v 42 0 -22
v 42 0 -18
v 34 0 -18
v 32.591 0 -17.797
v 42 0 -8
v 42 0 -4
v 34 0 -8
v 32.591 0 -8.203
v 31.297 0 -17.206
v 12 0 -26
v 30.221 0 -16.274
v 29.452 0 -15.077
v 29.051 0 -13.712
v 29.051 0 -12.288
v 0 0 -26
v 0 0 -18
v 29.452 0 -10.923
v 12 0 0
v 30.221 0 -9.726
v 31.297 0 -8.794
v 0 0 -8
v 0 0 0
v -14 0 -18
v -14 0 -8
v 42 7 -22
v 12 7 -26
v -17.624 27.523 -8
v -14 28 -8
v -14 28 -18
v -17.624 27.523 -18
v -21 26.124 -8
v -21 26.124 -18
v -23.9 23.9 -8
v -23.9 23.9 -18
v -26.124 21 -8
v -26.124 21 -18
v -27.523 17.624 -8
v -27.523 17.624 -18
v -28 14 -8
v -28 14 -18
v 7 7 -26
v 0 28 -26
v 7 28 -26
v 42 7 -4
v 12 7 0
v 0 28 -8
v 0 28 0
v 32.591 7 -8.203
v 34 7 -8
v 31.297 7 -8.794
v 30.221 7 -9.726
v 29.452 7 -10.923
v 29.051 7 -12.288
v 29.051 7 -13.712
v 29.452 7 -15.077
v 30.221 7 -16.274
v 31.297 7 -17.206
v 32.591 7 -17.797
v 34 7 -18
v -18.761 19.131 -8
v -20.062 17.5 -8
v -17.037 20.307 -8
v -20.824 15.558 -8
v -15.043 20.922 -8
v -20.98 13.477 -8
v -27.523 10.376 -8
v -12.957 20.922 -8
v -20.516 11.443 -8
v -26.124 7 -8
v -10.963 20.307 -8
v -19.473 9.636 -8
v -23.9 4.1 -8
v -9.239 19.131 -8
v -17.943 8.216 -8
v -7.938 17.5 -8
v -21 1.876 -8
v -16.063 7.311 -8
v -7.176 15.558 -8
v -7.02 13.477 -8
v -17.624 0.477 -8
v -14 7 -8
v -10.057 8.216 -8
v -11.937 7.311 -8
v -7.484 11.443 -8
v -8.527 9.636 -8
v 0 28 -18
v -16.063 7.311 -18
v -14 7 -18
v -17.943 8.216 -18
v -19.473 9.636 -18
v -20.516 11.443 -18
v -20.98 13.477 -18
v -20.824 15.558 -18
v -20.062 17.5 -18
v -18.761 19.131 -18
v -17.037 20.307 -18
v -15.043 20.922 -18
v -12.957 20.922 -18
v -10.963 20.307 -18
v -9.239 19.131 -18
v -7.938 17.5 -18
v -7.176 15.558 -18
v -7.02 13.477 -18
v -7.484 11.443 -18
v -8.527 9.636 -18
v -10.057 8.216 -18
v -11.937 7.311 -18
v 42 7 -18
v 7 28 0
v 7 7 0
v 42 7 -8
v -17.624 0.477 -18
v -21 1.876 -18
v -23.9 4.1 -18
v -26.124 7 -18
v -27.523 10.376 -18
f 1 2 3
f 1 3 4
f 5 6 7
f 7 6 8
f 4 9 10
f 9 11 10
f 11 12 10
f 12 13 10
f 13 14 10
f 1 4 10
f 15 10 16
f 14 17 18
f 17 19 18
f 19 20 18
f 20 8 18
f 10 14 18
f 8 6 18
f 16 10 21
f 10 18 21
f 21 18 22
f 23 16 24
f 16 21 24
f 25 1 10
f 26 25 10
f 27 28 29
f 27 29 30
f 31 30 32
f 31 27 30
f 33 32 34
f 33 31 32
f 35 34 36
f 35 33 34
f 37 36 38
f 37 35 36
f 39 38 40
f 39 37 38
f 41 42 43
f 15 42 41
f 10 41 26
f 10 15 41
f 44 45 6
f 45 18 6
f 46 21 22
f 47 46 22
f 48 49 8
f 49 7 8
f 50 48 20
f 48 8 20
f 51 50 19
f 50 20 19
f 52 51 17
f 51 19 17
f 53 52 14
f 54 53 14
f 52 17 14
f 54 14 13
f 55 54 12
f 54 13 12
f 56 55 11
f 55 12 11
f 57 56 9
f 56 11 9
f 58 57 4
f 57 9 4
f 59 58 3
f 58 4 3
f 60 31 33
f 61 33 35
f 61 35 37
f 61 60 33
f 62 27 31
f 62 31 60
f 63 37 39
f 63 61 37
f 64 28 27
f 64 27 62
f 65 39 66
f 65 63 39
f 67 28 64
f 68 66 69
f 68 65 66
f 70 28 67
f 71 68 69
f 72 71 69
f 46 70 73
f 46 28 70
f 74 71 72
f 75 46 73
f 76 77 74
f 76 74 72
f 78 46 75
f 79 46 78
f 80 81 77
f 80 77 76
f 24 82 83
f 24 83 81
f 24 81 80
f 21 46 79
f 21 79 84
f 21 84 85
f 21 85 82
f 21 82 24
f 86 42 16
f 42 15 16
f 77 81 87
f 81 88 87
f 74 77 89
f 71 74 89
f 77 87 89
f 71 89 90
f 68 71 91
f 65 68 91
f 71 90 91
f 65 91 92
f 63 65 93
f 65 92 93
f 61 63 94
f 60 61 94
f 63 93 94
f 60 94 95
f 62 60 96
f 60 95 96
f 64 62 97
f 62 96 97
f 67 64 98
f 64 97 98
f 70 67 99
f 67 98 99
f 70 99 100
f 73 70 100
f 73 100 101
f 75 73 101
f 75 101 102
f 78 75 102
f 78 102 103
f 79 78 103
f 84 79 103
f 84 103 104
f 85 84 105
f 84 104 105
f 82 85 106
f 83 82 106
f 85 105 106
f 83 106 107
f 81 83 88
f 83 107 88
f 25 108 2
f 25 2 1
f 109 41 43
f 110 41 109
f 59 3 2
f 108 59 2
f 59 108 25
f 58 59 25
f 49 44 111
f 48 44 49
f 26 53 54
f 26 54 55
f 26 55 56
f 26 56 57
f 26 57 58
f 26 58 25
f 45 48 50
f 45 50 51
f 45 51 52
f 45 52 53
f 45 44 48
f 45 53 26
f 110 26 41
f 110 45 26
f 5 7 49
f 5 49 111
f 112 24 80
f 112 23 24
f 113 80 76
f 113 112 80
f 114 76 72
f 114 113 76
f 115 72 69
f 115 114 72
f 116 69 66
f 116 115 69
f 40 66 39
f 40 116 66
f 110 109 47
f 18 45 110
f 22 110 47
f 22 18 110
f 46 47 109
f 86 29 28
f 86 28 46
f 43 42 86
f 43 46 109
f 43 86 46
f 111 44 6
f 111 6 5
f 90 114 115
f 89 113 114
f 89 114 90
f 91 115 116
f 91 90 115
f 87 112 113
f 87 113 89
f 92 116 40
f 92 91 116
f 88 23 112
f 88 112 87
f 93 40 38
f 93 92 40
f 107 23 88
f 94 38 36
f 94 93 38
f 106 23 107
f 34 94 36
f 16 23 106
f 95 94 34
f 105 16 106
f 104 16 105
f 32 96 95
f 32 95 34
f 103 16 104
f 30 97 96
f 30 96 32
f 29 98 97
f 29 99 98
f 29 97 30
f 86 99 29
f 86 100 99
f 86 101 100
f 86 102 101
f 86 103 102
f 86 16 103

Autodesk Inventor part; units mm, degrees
ref_plane "YZ Plane" through (0, 0, 0) normal (1, 0, 0) x (0, 1, 0)
ref_plane "XZ Plane" through (0, 0, 0) normal (0, 1, 0) x (-1, 0, 0)
ref_plane "XY Plane" through (0, 0, 0) normal (0, 0, 1) x (1, 0, 0)
sketch "Szkic1" plane through (0, 0, 0) normal (0, 1, 0) x (-1, 0, 0)
  line L0 (0, 0) -> (-12, 0)
  line L1 (-12, 0) -> (-12, -26)
  line L2 (-12, -26) -> (0, -26)
  line L3 (0, -26) -> (0, 0)
  line L4 (-12, 0) -> (-42, -4)
  line L5 (-42, -4) -> (-42, -22)
  line L6 (-42, -22) -> (-12, -26)
  circle A0 centre (-34, -13) radius 5
  line L7 (-34, -18) -> (-42, -18)
  line L8 (-34, -8) -> (-42, -8)
  dimension "d0" = 12
  dimension "d1" = 26
  dimension "d2" = 18
  dimension "d3" = 30
  dimension "d4" = 10
extrude "Wyciągnięcie proste1" add sketch "Szkic1" along normal blind 7 contours L3 L2 L1 L0 | L1 L6 L5 L7 A0 L8 L4
sketch "Szkic2" plane through (0, 7, 0) normal (0, 1, 0) x (1, 0, 0)
  line L0 (0, 26) -> (0, 0) projected
  line L1 (0, 26) -> (7, 26)
  line L2 (7, 26) -> (7, 0)
  line L3 (7, 0) -> (0, 0)
  line L4 (0, 0) -> (0, 26)
extrude "Wyciągnięcie proste2" add sketch "Szkic2" along normal blind 21
sketch "Szkic3" plane through (0, 0, -26) normal (-1, 0, 0) x (0, 0, 1)
  line L0 (8, 28) -> (18, 28)
  line L1 (18, 28) -> (18, 0)
  line L2 (18, 0) -> (8, 0)
  line L3 (8, 0) -> (8, 28)
  line L4 (0, 0) -> (0, 28) projected
  point P0 (26, 0)
  dimension "d9" = 10
  dimension "d10" = 8
extrude "Wyciągnięcie proste3" add sketch "Szkic3" along normal blind 28
sketch "Szkic4" plane through (0, 0, -8) normal (0, 0, 1) x (1, 0, 0)
  point P0 (0, 0)
  point P1 (-14, 14)
hole "Otwór1" at (-14, 14, -8) direction (0, 0, -1) diameter 14 end through all
full round fillet "Zaokrąglenie pełne1" first side at (-18.6667, 28, -14.6667) centre faces at (-28, 18.6667, -14.6667) second side at (17.6788, 0, -13.2009)
